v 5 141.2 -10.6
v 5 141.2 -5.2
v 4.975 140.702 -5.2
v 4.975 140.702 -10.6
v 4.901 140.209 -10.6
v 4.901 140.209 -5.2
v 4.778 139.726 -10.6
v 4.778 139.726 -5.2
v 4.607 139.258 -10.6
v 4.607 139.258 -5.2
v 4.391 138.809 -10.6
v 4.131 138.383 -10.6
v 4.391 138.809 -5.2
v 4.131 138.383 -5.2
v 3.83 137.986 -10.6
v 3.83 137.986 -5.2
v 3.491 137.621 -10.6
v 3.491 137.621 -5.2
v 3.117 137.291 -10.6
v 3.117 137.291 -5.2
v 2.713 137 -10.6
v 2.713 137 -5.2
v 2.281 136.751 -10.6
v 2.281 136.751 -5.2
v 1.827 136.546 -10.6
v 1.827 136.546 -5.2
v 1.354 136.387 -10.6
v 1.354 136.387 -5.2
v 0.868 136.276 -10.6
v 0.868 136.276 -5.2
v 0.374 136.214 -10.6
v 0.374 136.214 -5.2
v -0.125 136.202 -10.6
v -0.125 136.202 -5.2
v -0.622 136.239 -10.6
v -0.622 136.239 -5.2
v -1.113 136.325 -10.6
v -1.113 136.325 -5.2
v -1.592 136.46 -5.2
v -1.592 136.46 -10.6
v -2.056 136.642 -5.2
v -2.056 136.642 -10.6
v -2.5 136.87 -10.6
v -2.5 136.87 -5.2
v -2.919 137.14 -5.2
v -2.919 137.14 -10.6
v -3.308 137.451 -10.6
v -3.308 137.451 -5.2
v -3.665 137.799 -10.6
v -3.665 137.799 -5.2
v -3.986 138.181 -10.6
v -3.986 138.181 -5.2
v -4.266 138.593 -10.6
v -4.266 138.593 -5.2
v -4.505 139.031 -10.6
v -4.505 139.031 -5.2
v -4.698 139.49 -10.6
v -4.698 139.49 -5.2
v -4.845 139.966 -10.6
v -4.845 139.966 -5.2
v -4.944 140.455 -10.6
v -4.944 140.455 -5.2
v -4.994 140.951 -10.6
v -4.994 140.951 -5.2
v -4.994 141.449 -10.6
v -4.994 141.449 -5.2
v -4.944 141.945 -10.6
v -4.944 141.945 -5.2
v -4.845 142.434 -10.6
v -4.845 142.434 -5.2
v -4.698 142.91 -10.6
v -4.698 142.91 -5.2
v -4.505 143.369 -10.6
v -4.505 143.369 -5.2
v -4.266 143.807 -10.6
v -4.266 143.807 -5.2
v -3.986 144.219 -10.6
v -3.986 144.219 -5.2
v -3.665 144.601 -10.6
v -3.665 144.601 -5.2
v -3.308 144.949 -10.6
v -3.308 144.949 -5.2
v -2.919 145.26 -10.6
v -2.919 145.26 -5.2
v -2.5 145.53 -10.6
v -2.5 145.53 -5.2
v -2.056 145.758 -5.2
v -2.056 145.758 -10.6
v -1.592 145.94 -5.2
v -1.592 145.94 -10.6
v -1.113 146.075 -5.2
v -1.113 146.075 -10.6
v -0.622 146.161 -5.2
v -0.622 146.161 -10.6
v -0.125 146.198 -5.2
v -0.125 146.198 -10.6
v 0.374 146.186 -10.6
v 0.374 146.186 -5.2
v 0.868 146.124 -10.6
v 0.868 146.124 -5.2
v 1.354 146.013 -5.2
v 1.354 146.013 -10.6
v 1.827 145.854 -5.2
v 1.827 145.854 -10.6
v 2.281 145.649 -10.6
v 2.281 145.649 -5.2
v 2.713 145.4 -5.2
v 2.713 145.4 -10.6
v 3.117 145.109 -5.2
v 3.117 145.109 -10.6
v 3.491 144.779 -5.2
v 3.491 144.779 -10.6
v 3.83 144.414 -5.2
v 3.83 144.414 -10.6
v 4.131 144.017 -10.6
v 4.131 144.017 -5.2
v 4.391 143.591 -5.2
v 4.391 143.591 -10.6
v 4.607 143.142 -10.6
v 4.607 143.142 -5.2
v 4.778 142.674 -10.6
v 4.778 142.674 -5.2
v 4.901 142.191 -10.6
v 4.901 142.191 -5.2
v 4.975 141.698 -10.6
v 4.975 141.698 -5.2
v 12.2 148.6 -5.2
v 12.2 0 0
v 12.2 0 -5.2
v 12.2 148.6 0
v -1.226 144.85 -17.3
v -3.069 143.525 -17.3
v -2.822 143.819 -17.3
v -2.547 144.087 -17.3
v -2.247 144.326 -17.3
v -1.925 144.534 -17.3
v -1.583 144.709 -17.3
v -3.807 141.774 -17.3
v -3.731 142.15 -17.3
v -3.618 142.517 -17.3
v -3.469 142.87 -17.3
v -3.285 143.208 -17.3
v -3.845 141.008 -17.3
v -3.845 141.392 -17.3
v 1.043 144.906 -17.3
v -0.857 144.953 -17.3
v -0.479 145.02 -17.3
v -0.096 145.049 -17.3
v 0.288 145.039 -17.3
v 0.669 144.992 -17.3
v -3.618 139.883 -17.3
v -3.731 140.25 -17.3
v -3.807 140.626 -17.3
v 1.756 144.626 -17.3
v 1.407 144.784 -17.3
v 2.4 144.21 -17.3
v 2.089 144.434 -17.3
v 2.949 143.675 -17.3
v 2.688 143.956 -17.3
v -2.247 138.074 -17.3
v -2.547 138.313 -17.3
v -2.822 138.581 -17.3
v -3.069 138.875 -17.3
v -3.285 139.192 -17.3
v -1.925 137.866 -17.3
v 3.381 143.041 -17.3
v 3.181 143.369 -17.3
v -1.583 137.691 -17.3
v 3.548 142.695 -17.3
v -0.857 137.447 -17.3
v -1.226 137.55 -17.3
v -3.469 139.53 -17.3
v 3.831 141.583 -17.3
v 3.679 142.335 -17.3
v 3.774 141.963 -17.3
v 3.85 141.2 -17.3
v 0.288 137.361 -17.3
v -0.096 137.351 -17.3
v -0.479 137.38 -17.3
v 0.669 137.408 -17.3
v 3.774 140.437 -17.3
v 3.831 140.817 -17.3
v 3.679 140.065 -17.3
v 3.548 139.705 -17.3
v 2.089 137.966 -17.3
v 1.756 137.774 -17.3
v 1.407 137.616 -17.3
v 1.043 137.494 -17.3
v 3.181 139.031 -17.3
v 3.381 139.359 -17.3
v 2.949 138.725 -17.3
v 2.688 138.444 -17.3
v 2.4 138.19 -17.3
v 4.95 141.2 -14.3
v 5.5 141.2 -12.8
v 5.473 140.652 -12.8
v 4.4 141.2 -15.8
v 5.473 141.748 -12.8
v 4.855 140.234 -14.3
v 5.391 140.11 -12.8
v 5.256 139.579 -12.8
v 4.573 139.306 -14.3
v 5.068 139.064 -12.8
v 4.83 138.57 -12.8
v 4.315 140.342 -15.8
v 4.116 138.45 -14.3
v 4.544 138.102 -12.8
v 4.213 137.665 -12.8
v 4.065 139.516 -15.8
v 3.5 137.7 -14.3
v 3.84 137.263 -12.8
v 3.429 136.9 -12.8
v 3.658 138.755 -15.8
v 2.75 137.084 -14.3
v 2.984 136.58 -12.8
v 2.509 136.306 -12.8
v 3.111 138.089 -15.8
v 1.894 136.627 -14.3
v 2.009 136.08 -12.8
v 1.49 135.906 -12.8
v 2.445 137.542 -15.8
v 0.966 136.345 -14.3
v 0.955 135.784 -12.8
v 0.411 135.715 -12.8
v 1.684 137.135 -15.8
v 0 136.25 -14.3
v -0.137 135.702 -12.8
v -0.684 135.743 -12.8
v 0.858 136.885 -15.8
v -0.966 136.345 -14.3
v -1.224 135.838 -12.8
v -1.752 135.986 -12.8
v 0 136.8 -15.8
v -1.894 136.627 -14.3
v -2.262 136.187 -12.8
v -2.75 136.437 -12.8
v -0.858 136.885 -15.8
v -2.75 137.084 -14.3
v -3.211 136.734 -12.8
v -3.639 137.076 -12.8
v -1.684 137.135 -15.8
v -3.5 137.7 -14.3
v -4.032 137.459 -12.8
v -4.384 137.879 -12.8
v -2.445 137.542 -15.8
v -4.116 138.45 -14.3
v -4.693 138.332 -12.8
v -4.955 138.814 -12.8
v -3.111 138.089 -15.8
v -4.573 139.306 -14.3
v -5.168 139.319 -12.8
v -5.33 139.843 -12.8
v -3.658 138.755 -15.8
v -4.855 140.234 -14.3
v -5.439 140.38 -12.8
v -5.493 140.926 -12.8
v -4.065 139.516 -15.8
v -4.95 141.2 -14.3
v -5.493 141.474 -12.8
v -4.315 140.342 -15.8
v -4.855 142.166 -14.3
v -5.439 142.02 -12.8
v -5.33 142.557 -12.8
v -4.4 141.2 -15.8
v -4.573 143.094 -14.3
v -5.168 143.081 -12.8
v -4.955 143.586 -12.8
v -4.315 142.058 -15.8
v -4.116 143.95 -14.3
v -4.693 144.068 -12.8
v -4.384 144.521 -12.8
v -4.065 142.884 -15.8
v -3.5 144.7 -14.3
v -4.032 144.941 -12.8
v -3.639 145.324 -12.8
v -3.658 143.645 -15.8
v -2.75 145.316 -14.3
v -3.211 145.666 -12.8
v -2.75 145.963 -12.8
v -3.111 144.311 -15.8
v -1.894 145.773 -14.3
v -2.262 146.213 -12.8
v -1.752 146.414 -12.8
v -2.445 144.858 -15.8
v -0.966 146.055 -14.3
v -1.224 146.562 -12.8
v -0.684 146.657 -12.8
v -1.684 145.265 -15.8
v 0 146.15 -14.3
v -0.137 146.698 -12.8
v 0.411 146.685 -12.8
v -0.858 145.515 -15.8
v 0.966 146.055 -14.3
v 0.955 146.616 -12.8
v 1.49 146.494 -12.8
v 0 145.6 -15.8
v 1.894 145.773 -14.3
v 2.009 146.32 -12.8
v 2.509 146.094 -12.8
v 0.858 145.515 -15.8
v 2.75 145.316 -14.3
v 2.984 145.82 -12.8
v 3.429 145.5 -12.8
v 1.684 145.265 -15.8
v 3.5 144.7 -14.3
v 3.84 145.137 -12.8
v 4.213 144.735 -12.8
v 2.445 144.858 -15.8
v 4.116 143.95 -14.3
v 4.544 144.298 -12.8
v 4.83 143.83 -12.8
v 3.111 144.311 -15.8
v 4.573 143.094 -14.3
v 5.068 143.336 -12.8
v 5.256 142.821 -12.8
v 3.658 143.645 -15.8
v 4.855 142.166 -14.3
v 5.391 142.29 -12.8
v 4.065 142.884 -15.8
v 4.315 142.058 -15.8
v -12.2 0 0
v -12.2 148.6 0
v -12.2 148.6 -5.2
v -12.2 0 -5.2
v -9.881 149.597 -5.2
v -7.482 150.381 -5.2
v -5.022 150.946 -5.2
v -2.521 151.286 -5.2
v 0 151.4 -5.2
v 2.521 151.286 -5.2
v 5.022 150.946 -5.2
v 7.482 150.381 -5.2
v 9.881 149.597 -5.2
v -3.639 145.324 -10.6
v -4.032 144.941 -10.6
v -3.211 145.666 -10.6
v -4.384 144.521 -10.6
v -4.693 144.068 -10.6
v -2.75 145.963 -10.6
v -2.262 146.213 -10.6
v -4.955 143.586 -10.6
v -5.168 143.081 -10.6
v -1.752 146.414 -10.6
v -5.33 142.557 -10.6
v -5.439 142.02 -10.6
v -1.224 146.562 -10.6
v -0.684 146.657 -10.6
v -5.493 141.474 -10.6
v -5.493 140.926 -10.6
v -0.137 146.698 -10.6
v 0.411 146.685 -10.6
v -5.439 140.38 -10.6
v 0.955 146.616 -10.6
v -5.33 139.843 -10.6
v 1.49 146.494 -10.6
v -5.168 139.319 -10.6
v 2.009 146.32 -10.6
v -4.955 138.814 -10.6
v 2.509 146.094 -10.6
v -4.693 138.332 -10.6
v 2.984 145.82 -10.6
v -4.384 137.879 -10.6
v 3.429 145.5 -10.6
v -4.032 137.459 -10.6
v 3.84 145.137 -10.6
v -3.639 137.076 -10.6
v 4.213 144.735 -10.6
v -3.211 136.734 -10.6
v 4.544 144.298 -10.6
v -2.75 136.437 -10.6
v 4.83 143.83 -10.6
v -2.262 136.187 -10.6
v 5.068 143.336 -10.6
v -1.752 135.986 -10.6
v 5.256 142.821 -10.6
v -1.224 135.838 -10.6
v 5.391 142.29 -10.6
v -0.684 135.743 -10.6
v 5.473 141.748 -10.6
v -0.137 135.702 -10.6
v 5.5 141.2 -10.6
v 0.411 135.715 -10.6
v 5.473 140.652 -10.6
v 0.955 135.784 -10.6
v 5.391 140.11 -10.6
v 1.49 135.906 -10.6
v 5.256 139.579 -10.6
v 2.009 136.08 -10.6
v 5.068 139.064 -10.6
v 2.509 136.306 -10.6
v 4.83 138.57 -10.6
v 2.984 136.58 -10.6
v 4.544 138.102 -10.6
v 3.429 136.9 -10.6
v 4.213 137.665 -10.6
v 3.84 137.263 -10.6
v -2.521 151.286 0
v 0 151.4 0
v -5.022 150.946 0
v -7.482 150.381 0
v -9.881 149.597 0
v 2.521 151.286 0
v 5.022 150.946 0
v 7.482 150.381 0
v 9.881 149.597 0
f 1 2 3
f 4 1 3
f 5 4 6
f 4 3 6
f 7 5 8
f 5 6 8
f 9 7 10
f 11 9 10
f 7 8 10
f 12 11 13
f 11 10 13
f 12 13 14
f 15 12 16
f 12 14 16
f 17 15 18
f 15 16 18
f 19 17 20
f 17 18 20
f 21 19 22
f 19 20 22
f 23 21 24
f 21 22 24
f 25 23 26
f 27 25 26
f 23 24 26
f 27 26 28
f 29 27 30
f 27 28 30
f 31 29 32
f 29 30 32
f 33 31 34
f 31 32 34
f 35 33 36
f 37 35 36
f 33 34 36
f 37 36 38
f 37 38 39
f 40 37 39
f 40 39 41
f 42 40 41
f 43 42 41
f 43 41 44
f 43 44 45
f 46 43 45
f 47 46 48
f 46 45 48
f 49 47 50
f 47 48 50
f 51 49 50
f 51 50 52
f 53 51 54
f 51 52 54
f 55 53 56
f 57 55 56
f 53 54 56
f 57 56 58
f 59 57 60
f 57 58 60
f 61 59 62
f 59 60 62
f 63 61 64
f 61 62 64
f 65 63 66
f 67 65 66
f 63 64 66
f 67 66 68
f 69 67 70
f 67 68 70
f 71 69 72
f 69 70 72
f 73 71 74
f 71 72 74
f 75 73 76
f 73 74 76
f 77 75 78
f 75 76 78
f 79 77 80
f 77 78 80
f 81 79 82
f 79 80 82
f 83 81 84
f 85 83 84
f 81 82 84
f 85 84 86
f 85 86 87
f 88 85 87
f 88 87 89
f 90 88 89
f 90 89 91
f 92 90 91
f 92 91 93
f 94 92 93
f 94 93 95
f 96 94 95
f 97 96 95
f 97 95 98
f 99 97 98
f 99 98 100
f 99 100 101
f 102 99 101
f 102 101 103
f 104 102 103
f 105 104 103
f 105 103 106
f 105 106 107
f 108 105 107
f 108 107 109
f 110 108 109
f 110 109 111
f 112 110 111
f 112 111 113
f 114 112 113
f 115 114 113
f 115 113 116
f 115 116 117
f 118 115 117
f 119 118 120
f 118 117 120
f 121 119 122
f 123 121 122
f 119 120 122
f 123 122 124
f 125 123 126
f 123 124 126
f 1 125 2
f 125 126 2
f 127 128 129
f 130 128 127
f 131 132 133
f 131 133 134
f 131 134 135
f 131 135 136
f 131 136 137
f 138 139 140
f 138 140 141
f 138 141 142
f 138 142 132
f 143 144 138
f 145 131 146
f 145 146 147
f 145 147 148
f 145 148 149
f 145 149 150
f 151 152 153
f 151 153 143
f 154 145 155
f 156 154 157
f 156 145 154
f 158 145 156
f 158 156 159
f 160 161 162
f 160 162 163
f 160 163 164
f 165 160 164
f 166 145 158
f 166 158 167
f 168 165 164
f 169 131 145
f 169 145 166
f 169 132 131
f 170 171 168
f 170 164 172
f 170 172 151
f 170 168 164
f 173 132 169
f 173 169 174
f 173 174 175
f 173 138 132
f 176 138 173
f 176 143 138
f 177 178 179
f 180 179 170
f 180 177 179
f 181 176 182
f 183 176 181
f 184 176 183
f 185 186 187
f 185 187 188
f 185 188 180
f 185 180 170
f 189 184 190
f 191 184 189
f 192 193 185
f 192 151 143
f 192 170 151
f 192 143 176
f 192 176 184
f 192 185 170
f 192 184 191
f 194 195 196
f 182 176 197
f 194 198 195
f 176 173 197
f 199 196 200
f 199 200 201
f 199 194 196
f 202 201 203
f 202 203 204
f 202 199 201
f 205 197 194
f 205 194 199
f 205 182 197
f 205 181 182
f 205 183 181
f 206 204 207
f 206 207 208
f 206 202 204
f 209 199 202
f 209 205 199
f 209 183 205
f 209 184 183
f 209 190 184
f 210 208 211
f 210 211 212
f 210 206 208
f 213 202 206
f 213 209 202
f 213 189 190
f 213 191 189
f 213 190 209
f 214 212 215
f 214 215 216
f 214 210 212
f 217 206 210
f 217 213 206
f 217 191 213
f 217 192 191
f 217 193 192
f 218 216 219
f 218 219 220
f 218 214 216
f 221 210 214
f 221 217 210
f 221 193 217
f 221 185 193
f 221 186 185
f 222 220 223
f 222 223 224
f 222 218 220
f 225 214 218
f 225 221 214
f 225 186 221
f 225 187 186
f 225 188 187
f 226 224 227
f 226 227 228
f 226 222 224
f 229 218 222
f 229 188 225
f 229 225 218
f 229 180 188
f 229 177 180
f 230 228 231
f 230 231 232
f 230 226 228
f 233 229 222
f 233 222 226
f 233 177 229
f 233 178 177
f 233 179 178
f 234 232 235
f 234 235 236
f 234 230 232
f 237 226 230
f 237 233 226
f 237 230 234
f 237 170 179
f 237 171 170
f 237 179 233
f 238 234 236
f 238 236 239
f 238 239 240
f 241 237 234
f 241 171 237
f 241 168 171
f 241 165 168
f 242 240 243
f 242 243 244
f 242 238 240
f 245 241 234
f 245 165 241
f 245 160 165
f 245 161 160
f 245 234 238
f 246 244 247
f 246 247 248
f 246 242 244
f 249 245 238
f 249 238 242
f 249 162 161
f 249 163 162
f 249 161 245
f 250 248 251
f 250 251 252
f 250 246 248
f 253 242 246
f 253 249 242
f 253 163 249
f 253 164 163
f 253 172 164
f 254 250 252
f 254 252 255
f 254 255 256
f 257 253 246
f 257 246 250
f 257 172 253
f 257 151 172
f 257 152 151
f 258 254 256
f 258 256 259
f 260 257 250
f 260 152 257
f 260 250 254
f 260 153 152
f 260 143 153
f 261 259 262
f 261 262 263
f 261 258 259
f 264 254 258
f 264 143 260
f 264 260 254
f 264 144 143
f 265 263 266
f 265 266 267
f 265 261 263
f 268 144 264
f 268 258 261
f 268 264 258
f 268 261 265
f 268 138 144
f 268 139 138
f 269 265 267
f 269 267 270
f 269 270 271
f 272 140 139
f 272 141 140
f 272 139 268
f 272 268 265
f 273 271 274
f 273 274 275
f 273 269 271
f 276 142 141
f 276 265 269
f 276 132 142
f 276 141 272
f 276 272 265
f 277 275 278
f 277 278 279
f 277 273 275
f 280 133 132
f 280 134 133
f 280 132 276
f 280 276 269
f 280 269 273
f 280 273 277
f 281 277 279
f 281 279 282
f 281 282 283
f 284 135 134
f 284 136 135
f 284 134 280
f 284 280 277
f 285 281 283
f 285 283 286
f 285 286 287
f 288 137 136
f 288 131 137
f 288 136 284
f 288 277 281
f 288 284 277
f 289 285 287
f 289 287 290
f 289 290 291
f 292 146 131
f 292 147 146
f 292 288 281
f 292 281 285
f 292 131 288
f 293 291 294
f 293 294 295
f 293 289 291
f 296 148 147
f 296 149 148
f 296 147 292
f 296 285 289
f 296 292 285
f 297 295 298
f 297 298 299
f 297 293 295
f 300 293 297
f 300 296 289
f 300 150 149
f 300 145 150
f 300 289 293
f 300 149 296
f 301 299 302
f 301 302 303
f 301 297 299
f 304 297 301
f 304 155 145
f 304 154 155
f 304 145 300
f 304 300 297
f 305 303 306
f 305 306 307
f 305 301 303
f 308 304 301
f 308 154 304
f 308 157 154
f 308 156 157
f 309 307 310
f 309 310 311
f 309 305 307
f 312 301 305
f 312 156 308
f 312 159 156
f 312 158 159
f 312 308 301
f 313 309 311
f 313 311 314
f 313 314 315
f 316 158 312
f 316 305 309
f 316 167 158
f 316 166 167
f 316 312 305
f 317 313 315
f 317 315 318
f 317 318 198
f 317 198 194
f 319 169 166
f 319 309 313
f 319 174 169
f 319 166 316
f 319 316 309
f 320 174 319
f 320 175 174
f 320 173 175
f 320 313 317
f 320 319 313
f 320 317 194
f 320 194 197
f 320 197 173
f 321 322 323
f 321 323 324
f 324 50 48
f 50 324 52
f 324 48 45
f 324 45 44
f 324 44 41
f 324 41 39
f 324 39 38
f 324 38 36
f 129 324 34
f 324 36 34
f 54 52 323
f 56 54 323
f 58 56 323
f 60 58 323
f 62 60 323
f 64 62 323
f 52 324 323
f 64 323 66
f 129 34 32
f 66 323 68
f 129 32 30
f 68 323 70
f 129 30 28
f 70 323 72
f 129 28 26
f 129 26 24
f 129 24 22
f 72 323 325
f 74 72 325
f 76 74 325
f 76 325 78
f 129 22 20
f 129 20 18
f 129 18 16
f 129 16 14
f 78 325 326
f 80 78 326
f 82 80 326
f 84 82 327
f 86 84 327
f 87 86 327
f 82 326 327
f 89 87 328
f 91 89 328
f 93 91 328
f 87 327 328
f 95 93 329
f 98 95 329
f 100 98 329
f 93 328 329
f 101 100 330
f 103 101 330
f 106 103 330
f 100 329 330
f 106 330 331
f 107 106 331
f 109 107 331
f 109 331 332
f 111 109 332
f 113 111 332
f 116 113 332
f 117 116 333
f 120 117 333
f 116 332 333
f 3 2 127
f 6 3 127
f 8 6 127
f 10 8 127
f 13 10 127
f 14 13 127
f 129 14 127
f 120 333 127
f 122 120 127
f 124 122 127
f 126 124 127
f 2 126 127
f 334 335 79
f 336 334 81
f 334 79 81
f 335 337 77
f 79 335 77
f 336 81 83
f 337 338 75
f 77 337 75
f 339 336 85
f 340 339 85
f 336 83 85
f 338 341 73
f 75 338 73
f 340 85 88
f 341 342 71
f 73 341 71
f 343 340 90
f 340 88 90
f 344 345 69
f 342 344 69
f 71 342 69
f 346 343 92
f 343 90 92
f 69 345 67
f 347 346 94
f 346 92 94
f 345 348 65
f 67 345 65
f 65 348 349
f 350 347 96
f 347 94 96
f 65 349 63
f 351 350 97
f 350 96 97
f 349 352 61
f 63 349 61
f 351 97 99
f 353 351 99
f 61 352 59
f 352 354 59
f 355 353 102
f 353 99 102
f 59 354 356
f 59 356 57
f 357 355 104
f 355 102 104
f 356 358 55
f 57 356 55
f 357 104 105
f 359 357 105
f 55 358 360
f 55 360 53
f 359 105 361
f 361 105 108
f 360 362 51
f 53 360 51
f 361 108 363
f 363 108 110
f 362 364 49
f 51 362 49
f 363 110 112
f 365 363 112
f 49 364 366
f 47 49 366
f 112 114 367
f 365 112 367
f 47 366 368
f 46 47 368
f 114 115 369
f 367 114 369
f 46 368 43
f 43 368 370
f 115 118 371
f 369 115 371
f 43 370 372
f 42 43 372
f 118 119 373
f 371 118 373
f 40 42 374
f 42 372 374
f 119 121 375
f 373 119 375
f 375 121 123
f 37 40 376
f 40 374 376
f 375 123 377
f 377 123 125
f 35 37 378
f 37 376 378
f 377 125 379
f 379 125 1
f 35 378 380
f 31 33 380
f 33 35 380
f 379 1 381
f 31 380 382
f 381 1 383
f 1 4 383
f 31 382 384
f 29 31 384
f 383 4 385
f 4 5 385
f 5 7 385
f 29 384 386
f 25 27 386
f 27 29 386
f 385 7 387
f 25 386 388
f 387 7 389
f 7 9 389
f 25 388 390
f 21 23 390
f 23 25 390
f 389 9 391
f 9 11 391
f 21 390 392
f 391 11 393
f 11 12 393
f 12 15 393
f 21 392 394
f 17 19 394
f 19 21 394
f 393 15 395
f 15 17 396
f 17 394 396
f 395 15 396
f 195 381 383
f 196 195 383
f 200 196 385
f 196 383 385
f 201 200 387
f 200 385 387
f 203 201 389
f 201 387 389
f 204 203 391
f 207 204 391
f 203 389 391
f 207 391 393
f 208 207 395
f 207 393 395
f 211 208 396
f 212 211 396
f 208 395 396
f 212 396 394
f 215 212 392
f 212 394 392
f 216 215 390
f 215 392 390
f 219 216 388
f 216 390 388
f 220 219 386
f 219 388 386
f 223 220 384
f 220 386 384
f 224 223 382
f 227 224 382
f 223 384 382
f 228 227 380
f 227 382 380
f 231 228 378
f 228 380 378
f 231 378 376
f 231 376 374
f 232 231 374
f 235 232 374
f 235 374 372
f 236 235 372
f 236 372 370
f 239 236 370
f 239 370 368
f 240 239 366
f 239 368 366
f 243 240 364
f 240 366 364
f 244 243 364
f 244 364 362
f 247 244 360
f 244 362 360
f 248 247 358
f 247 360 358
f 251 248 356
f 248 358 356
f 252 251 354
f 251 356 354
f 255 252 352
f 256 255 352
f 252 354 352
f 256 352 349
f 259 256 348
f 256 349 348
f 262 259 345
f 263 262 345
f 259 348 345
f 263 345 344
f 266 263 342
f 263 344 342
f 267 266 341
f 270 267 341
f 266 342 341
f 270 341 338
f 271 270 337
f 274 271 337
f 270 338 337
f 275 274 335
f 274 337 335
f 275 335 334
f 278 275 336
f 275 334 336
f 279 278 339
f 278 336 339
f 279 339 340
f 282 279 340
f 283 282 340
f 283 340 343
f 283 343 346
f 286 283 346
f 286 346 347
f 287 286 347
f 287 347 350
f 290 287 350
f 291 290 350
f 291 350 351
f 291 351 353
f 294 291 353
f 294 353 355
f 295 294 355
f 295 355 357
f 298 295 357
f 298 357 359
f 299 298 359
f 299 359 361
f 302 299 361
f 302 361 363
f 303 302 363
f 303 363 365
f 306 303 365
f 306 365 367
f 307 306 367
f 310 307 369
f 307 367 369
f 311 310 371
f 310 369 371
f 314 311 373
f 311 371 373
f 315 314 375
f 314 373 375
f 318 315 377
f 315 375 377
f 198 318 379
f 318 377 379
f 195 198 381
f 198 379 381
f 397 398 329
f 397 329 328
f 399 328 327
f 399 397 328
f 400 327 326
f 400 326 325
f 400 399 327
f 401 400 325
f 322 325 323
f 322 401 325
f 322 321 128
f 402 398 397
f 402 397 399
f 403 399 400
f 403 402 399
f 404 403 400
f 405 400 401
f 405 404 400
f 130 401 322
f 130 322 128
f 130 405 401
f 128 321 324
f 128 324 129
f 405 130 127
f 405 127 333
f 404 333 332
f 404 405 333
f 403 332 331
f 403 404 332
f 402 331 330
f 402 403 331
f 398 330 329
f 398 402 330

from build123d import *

# Parameters (mm, degrees)
F1_DEPTH = 5.2
F2_R     = 5
F3_DEPTH = 5.4
F5_R     = 5.5
F6_DEPTH = 2.2
F10_R    = 5.5
F8_R     = 3.85


with BuildPart() as f1:
    # F0 (on Top) → F1 (new body)
    with BuildSketch(Plane.XY):
        Polygon((-12.2, 0), (0, 0), (12.2, 0), (12.2, 148.6), (0, 148.6), (-12.2, 148.6), align=None)
        with BuildLine():
            Line((0, 148.6), (12.2, 148.6))
            ThreePointArc((12.2, 148.6), (6.2585940913, 150.6910171122), (0, 151.4))
            Line((0, 151.4), (0, 148.6))
        make_face()
        with BuildLine():
            ThreePointArc((0, 151.4), (-6.2585940913, 150.6910171122), (-12.2, 148.6))
            Line((-12.2, 148.6), (0, 148.6))
            Line((0, 148.6), (0, 151.4))
        make_face()
    extrude(amount=-F1_DEPTH)

    # F2 (on face) → F3 (join)
    with BuildSketch(Plane(origin=(0, 0, -5.2), x_dir=(1, 0, 0), z_dir=(0, 0, -1))):
        with Locations((0, -141.2)):
            Circle(F2_R)
    extrude(amount=F3_DEPTH)

    # F5 (on offset) → F6 (join)
    with BuildSketch(Plane(origin=(0, 0, -10.6), x_dir=(1, 0, 0), z_dir=(0, 0, -1))):
        with Locations((0, -141.2)):
            Circle(F5_R)
    extrude(amount=F6_DEPTH)

    # F10 (on offset) → F11 section 0
    with BuildSketch(Plane(origin=(0, 0, -12.8), x_dir=(1, 0, 0), z_dir=(0, 0, -1))):
        with Locations((0, -141.2)):
            Circle(F10_R)
    # F8 (on offset) → F11 section 1
    with BuildSketch(Plane(origin=(0, 0, -17.3), x_dir=(1, 0, 0), z_dir=(0, 0, -1))):
        with Locations((0, -141.2)):
            Circle(F8_R)
    loft()


solid = f1.part
